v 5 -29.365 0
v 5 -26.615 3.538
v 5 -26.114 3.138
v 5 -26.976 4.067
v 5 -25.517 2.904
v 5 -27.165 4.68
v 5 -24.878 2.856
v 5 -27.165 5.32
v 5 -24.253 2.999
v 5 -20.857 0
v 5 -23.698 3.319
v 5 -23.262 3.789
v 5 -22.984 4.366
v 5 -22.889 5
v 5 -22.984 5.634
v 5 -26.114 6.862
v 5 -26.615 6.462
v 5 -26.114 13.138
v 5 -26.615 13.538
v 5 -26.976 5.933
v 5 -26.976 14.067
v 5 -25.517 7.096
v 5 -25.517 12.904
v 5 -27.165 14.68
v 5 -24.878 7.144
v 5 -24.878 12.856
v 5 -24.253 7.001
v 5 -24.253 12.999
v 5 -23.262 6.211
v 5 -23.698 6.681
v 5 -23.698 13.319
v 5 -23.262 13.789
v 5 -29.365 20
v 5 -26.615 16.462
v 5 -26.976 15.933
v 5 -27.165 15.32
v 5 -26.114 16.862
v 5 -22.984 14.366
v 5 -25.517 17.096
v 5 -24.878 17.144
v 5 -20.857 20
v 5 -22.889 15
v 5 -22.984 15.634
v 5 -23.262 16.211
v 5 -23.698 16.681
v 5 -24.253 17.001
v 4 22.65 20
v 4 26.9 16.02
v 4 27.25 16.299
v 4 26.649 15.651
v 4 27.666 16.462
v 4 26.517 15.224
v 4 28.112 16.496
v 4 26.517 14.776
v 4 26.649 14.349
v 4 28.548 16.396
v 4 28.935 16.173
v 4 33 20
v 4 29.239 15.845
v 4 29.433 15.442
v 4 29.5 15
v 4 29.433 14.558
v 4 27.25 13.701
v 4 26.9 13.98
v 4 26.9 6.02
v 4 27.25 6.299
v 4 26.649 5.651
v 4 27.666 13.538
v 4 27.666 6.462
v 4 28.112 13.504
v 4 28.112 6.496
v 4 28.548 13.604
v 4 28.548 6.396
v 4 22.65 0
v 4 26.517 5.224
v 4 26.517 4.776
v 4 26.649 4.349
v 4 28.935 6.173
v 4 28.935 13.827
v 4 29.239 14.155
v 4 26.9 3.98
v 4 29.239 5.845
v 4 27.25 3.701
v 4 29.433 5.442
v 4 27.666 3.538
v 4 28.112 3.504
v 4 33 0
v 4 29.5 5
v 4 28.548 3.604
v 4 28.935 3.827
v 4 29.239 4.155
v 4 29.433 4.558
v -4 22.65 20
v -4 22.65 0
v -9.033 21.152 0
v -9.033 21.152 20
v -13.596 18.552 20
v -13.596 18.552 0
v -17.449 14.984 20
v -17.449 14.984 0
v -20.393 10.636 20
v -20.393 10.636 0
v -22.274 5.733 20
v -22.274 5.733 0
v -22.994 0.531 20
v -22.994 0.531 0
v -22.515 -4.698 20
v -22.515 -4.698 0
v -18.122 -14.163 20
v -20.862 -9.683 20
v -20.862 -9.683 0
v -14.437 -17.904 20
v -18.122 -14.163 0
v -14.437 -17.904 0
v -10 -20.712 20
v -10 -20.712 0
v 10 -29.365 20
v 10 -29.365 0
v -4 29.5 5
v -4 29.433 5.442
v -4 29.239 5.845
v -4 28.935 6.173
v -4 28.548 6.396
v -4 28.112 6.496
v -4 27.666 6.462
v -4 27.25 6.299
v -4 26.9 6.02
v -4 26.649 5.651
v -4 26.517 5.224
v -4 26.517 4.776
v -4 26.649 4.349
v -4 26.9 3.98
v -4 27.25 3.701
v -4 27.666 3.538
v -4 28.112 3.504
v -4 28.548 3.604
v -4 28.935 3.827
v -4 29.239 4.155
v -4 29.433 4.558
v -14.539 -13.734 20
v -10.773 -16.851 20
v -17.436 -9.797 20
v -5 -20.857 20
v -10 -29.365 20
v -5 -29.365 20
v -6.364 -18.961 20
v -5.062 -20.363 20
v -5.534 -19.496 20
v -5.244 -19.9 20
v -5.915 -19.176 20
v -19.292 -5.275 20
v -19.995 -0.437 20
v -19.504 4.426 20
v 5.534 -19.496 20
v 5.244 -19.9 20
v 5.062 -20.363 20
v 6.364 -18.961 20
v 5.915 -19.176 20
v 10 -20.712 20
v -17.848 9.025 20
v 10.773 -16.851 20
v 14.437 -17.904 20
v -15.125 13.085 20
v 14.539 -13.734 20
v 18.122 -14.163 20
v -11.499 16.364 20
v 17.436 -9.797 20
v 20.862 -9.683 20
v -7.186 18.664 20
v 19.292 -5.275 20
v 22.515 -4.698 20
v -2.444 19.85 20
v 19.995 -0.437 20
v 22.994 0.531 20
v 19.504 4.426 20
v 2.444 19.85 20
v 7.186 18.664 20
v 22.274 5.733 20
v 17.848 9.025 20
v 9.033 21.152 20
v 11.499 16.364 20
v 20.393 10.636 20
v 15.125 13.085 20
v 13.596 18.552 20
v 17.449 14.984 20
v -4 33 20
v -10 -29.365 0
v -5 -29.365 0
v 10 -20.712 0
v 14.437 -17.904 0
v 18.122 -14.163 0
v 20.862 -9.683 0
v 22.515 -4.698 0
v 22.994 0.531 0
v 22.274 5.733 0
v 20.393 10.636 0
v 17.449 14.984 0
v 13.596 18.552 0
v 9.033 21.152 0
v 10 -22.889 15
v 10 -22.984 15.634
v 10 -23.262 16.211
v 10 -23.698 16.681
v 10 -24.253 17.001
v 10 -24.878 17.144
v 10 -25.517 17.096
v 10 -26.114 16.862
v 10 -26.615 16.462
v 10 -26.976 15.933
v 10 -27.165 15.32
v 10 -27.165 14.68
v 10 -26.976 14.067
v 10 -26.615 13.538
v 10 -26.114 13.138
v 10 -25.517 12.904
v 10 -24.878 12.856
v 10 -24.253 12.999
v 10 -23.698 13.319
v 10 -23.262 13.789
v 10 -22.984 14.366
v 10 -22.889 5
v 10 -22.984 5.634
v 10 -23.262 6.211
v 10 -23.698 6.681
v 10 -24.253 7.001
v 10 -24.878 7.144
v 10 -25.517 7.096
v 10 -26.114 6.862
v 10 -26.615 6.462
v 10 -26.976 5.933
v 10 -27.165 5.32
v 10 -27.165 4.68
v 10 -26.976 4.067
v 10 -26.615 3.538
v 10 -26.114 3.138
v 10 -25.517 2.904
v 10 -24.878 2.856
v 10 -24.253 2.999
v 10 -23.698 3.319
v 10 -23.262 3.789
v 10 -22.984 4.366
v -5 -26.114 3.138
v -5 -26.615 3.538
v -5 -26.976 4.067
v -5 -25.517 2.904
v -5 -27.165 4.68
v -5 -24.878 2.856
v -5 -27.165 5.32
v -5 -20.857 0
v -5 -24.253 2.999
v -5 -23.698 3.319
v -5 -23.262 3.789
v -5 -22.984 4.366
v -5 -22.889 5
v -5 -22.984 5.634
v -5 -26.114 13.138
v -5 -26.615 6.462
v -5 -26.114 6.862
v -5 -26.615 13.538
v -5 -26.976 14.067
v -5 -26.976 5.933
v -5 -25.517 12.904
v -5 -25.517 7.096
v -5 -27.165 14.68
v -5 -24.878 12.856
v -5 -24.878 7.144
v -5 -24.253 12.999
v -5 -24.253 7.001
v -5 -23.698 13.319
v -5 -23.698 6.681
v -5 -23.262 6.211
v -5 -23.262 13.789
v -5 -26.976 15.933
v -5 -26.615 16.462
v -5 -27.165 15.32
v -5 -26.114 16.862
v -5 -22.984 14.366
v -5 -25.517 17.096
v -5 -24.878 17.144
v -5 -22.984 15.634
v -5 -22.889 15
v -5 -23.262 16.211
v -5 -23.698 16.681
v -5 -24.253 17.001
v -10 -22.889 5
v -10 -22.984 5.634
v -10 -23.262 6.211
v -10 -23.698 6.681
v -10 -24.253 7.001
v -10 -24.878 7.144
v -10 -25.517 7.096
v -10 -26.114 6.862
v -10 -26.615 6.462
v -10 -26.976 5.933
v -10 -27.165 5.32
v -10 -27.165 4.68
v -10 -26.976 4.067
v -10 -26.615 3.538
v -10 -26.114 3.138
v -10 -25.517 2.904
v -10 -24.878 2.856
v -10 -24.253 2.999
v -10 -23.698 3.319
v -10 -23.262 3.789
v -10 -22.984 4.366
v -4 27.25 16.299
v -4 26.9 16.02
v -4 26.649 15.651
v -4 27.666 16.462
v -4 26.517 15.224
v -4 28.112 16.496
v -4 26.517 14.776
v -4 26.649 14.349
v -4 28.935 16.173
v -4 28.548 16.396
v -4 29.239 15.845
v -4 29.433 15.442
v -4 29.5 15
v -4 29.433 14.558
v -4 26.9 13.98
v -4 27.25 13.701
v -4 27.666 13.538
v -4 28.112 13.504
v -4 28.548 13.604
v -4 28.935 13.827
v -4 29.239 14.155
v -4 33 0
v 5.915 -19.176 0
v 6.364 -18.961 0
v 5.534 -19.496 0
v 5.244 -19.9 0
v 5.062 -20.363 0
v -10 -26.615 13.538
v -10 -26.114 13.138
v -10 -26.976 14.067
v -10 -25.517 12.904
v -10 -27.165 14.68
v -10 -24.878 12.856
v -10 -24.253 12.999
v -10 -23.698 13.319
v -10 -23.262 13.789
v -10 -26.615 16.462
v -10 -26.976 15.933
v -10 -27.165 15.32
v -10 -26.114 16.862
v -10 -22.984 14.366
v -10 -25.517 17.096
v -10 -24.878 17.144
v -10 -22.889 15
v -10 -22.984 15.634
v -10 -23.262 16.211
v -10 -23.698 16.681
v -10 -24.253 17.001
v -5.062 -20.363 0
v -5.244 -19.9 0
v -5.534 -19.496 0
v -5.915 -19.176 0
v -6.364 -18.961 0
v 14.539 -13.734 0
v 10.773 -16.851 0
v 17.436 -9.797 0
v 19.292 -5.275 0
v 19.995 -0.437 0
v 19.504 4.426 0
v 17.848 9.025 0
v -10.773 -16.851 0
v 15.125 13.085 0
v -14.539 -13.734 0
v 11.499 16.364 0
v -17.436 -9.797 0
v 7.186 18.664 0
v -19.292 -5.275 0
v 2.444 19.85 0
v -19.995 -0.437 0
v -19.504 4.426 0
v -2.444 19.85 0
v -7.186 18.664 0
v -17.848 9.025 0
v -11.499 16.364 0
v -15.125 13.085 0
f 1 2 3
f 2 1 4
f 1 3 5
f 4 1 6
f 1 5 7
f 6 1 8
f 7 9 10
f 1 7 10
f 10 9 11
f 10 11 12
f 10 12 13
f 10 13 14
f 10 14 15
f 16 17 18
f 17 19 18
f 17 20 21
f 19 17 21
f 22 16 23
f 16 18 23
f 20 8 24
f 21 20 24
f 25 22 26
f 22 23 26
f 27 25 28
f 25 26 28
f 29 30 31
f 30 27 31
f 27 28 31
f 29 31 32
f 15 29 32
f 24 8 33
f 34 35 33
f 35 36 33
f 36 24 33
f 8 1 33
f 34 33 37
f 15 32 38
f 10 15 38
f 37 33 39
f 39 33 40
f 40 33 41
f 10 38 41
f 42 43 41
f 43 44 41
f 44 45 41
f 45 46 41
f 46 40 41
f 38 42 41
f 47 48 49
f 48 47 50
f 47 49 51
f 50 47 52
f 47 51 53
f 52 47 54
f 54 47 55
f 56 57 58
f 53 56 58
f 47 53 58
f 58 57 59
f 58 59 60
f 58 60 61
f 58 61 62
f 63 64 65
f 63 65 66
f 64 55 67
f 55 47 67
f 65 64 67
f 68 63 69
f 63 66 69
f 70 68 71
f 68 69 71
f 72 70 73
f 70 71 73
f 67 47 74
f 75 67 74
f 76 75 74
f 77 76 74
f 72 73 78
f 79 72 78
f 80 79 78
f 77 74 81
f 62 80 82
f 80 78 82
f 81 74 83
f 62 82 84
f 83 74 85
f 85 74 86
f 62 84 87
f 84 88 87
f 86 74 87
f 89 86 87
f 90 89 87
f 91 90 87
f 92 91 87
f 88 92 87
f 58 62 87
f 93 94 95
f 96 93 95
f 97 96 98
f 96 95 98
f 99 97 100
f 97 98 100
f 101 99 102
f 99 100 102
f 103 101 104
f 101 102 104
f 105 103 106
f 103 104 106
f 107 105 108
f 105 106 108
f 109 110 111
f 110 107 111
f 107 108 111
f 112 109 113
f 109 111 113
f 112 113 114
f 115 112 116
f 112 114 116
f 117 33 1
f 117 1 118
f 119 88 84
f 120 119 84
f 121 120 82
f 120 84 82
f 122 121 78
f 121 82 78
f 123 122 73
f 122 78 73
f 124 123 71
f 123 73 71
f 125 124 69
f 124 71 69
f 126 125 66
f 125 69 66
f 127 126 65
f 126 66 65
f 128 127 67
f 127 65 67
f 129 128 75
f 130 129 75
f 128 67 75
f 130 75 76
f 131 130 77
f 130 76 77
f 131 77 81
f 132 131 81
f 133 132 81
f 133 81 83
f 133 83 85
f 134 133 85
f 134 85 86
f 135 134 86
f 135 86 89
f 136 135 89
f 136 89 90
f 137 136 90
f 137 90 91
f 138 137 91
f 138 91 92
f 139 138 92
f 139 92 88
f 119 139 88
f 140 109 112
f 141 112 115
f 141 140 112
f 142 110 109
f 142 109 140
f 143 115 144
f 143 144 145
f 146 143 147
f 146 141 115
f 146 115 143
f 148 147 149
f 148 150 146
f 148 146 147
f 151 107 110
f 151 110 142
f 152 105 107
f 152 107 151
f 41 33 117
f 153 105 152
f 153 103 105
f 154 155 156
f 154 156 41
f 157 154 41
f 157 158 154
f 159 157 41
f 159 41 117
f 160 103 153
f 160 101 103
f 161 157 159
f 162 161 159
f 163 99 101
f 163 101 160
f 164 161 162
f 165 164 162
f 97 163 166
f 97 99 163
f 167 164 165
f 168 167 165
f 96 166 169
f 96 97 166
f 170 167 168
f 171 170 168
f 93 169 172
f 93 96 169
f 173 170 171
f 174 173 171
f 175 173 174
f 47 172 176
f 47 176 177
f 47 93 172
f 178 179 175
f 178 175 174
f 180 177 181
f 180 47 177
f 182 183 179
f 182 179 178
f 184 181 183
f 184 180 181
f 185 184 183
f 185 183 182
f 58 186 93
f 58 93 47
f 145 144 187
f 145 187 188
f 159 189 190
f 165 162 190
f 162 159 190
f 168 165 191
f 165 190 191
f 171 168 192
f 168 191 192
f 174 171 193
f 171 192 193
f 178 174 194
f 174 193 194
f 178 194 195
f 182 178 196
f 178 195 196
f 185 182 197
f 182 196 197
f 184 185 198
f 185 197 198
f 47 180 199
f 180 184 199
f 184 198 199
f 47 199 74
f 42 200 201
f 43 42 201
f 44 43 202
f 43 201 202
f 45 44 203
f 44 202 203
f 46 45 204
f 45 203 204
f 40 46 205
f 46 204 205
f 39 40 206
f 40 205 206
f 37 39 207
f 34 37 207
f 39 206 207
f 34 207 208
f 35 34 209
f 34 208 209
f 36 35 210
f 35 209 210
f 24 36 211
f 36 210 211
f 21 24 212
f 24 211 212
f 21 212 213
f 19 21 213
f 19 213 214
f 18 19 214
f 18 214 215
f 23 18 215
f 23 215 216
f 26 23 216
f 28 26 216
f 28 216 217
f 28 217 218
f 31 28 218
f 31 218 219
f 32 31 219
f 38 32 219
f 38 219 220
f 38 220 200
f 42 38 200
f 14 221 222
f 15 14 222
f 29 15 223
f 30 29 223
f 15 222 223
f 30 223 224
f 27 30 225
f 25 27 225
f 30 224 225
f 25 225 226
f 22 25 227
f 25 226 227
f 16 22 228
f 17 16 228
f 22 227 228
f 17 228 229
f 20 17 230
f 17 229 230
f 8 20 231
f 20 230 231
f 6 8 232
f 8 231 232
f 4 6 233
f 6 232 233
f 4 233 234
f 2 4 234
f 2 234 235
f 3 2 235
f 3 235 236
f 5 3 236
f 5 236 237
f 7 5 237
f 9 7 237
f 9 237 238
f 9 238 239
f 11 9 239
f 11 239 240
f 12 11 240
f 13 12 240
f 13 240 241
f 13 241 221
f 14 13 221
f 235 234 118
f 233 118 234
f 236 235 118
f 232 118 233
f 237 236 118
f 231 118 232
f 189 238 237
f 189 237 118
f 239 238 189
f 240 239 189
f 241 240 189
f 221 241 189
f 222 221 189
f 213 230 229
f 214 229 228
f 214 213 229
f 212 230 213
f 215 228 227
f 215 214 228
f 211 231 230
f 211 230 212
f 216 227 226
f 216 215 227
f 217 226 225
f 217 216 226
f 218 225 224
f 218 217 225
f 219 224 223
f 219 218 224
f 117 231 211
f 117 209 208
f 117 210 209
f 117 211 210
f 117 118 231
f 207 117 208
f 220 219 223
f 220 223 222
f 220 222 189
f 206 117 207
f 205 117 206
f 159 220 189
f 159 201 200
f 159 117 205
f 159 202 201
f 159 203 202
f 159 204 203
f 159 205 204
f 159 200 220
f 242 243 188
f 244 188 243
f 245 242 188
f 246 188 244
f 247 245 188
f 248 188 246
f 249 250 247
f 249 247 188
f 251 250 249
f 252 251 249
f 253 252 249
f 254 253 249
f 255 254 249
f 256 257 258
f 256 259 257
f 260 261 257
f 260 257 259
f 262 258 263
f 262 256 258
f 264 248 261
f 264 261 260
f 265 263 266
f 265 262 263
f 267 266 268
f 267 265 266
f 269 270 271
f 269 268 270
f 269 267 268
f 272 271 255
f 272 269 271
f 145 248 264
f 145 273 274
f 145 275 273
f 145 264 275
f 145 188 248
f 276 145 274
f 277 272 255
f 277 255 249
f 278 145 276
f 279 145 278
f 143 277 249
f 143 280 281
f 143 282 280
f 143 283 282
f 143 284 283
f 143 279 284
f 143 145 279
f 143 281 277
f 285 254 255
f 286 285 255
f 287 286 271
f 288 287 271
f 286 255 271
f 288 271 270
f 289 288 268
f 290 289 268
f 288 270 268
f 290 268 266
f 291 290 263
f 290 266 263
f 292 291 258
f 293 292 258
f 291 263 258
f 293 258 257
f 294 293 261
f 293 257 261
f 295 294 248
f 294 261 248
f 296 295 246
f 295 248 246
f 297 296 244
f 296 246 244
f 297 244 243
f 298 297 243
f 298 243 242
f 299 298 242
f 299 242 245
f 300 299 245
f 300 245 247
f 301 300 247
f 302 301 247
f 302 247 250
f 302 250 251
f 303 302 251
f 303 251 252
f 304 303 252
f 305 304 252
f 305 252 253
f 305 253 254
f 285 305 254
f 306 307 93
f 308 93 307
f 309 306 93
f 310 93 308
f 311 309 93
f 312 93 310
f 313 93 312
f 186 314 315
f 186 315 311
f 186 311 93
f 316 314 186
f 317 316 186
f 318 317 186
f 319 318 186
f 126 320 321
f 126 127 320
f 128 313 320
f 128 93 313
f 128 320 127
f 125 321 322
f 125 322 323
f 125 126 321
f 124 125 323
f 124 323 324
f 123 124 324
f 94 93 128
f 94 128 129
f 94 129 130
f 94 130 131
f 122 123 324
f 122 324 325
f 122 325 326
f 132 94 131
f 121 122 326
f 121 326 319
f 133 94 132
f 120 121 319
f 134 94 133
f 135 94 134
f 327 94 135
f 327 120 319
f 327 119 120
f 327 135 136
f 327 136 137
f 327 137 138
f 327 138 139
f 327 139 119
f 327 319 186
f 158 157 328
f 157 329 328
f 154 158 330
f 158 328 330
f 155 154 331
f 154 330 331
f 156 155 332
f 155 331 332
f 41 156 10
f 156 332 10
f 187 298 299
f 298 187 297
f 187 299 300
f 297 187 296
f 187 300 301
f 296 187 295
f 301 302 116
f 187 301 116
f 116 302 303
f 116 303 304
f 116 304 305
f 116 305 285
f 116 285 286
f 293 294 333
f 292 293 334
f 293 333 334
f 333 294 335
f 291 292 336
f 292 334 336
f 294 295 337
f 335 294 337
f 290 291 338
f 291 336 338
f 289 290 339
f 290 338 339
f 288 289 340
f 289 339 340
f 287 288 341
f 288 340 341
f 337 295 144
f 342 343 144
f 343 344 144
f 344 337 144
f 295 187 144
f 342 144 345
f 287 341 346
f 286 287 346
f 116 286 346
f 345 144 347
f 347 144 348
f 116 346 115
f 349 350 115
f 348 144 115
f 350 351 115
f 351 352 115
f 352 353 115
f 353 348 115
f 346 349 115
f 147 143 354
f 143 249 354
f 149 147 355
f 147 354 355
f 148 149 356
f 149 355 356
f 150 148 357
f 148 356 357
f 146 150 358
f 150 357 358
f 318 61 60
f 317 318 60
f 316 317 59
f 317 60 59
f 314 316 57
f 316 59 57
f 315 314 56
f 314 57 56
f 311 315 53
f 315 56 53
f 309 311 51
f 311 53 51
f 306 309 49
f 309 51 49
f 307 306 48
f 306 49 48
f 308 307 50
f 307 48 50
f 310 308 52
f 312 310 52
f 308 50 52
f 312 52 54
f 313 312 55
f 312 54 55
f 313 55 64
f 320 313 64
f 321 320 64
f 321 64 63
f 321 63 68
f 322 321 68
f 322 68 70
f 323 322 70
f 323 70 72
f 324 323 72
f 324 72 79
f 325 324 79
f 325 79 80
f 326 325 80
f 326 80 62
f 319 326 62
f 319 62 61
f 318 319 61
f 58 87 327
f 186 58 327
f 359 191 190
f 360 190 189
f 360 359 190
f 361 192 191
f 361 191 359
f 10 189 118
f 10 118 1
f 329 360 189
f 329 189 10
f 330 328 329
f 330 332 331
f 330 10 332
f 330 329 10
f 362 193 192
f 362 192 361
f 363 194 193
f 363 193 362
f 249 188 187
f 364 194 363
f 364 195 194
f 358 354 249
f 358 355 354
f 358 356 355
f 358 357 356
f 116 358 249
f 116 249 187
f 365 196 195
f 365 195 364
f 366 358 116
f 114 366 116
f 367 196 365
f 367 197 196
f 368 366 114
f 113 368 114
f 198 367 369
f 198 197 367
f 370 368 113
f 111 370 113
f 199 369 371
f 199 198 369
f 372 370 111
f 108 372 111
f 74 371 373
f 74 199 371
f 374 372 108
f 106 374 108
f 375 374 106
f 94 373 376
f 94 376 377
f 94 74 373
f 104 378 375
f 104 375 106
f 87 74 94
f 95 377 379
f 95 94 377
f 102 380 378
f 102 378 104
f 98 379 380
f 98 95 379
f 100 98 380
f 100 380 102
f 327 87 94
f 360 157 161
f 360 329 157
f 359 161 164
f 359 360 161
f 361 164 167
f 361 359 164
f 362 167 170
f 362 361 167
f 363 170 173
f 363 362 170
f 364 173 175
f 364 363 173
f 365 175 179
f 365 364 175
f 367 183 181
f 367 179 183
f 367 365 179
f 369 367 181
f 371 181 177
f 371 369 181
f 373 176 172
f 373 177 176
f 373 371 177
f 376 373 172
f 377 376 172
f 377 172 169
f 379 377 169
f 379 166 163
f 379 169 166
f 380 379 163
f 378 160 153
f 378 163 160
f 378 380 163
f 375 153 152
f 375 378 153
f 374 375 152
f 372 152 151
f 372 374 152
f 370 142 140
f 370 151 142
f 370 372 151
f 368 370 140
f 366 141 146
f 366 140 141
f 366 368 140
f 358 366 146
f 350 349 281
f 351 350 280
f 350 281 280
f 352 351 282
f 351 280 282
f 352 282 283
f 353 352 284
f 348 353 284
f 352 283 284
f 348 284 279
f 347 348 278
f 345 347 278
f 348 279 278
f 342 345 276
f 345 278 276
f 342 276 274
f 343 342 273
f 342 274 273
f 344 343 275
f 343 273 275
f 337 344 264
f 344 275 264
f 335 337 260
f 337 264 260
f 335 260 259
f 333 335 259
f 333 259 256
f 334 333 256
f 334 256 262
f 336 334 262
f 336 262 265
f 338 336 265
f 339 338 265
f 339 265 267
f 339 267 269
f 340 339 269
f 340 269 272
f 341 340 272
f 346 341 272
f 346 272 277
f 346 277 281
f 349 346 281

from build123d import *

# Parameters (mm, degrees)
SKETCH_1_R          = 23
SKETCH_1_R_2        = 20
EXTRUDE_1_DEPTH     = 20
SKETCH_2_W          = 10
SKETCH_2_H          = 19.630909826
CUT_EXTRUDE_1_DEPTH = 20
SKETCH_3_W          = 5
SKETCH_3_H          = 10
EXTRUDE_2_DEPTH     = 20
FILLET_1_R          = 2
SKETCH_4_R          = 2.15
CUT_EXTRUDE_2_DEPTH = 20
SKETCH_5_W          = 8
SKETCH_5_H          = 11
EXTRUDE_3_DEPTH     = 20
SKETCH_6_R          = 1.5
CUT_EXTRUDE_3_DEPTH = 23


with BuildPart() as part:
    # 草图1 → 凸台-拉伸1 (new body)
    with BuildSketch(Plane.XY):
        Circle(SKETCH_1_R)
        Circle(SKETCH_1_R_2, mode=Mode.SUBTRACT)
    extrude(amount=EXTRUDE_1_DEPTH)

    # 草图2 → 切除-拉伸1 (cut)
    with BuildSketch(Plane.XY.offset(20)):
        with Locations((0, -20)):
            Rectangle(SKETCH_2_W, SKETCH_2_H)
    extrude(amount=-CUT_EXTRUDE_1_DEPTH, mode=Mode.SUBTRACT)

    # 草图3 → 凸台-拉伸2 (add)
    with BuildSketch(Plane.XY.offset(20)):
        with Locations((-7.5, -24.364916731)):
            Rectangle(SKETCH_3_W, SKETCH_3_H)
        with Locations((7.5, -24.364916731)):
            Rectangle(SKETCH_3_W, SKETCH_3_H)
    extrude(amount=-EXTRUDE_2_DEPTH)

    # 圆角1
    fillet_1_edges = [part.edges().sort_by_distance(p)[0] for p in [
        (5, -19.364916731, 10),
        (-5, -19.364916731, 10),
    ]]
    fillet(fillet_1_edges, radius=FILLET_1_R)

    # 草图4 → 切除-拉伸2 (cut)
    with BuildSketch(Plane(origin=(10, 0, 0), x_dir=(0, 0, -1), z_dir=(1, 0, 0))):
        with Locations(Location((-15, -25.038615954, 0), (0, 0, 90))):
            Circle(SKETCH_4_R)
        with Locations(Location((-5, -25.038615954, 0), (0, 0, 90))):
            Circle(SKETCH_4_R)
    extrude(amount=-CUT_EXTRUDE_2_DEPTH, mode=Mode.SUBTRACT)

    # 草图5 → 凸台-拉伸3 (add)
    with BuildSketch(Plane(origin=(0, 0, 0), x_dir=(-1, 0, 0), z_dir=(0, 0, -1))):
        with Locations((0, 27.5)):
            Rectangle(SKETCH_5_W, SKETCH_5_H)
    extrude(amount=-EXTRUDE_3_DEPTH)

    # 草图6 → 切除-拉伸3 (cut)
    with BuildSketch(Plane(origin=(4, 0, 0), x_dir=(0, 0, -1), z_dir=(1, 0, 0))):
        with Locations(Location((-5, 28, 0), (0, 0, 90))):
            Circle(SKETCH_6_R)
        with Locations(Location((-15, 28, 0), (0, 0, 90))):
            Circle(SKETCH_6_R)
    extrude(amount=-CUT_EXTRUDE_3_DEPTH, mode=Mode.SUBTRACT)


solid = part.part
